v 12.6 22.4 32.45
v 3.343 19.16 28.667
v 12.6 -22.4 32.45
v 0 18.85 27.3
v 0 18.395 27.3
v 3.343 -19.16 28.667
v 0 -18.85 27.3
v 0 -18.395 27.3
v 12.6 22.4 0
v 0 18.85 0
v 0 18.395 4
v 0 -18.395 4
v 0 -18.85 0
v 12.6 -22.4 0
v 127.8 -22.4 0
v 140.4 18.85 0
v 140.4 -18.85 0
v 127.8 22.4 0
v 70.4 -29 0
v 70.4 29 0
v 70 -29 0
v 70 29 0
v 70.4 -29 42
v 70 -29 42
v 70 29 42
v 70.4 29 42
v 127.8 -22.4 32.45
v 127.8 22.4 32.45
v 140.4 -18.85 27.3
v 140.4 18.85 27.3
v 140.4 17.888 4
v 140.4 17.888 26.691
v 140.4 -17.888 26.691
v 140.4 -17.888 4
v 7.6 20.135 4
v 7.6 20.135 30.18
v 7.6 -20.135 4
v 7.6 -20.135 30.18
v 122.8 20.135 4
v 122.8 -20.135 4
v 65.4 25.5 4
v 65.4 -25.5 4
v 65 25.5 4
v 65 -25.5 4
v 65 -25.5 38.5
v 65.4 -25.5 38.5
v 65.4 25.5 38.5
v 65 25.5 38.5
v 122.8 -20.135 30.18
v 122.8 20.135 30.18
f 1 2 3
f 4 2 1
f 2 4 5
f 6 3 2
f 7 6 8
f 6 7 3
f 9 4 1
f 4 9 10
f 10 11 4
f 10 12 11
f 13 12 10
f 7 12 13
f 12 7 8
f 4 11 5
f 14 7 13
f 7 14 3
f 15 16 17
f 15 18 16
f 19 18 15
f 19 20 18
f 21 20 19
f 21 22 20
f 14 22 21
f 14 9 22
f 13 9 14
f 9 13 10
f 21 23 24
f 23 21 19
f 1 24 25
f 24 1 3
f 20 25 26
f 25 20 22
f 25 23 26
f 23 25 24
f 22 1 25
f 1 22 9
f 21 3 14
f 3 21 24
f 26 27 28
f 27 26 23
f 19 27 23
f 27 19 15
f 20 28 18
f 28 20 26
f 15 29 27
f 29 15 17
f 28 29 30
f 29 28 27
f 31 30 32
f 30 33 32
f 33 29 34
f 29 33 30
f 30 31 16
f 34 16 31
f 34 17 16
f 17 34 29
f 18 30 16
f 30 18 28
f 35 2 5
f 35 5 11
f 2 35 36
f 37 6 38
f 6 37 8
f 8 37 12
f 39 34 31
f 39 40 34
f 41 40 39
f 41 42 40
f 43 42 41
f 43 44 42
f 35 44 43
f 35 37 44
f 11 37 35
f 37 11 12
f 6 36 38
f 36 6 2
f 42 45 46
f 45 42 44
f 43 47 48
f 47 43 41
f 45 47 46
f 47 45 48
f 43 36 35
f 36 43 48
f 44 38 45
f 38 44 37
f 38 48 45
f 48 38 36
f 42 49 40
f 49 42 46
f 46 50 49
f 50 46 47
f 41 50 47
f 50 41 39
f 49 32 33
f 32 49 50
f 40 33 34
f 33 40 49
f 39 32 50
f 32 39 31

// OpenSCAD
$fn = 32;

// ----------------------------------------------------------------------
// Faired channel: 140 x 58 x 42 mm, 3.5 mm walls, faired ends
// ----------------------------------------------------------------------

// --- parameters (mm) ---
length = 140;             // channel length
width = 58;               // channel width at mid length
height = 42;              // channel height at mid length
wall = 3.5;               // side wall thickness
floor_t = 4;              // floor thickness
end_w = 37.7;             // faired end width
end_h = 27.3;             // faired end height

difference() {
  union() {
    hull() {
      translate([0, -18.85, 0]) cube([0.4, 37.7, 27.3]);
      translate([12.6, -22.4, 0]) cube([0.4, 44.8, 32.45]);
    }
    hull() {
      translate([12.6, -22.4, 0]) cube([0.4, 44.8, 32.45]);
      translate([70, -29, 0]) cube([0.4, 58, 42]);
    }
    hull() {
      translate([70, -29, 0]) cube([0.4, 58, 42]);
      translate([127.4, -22.4, 0]) cube([0.4, 44.8, 32.45]);
    }
    hull() {
      translate([127.4, -22.4, 0]) cube([0.4, 44.8, 32.45]);
      translate([140, -18.85, 0]) cube([0.4, 37.7, 27.3]);
    }
  }
  /* cavity, 5 mm proud of both ends so the ports are cut clean */
  hull() {
    translate([-5, -17.25, 4]) cube([0.4, 34.5, 21.7]);
    translate([7.6, -20.135, 4]) cube([0.4, 40.27, 26.18]);
  }
  hull() {
    translate([7.6, -20.135, 4]) cube([0.4, 40.27, 26.18]);
    translate([65, -25.5, 4]) cube([0.4, 51, 34.5]);
  }
  hull() {
    translate([65, -25.5, 4]) cube([0.4, 51, 34.5]);
    translate([122.4, -20.135, 4]) cube([0.4, 40.27, 26.18]);
  }
  hull() {
    translate([122.4, -20.135, 4]) cube([0.4, 40.27, 26.18]);
    translate([145, -17.25, 4]) cube([0.4, 34.5, 21.7]);
  }
}
